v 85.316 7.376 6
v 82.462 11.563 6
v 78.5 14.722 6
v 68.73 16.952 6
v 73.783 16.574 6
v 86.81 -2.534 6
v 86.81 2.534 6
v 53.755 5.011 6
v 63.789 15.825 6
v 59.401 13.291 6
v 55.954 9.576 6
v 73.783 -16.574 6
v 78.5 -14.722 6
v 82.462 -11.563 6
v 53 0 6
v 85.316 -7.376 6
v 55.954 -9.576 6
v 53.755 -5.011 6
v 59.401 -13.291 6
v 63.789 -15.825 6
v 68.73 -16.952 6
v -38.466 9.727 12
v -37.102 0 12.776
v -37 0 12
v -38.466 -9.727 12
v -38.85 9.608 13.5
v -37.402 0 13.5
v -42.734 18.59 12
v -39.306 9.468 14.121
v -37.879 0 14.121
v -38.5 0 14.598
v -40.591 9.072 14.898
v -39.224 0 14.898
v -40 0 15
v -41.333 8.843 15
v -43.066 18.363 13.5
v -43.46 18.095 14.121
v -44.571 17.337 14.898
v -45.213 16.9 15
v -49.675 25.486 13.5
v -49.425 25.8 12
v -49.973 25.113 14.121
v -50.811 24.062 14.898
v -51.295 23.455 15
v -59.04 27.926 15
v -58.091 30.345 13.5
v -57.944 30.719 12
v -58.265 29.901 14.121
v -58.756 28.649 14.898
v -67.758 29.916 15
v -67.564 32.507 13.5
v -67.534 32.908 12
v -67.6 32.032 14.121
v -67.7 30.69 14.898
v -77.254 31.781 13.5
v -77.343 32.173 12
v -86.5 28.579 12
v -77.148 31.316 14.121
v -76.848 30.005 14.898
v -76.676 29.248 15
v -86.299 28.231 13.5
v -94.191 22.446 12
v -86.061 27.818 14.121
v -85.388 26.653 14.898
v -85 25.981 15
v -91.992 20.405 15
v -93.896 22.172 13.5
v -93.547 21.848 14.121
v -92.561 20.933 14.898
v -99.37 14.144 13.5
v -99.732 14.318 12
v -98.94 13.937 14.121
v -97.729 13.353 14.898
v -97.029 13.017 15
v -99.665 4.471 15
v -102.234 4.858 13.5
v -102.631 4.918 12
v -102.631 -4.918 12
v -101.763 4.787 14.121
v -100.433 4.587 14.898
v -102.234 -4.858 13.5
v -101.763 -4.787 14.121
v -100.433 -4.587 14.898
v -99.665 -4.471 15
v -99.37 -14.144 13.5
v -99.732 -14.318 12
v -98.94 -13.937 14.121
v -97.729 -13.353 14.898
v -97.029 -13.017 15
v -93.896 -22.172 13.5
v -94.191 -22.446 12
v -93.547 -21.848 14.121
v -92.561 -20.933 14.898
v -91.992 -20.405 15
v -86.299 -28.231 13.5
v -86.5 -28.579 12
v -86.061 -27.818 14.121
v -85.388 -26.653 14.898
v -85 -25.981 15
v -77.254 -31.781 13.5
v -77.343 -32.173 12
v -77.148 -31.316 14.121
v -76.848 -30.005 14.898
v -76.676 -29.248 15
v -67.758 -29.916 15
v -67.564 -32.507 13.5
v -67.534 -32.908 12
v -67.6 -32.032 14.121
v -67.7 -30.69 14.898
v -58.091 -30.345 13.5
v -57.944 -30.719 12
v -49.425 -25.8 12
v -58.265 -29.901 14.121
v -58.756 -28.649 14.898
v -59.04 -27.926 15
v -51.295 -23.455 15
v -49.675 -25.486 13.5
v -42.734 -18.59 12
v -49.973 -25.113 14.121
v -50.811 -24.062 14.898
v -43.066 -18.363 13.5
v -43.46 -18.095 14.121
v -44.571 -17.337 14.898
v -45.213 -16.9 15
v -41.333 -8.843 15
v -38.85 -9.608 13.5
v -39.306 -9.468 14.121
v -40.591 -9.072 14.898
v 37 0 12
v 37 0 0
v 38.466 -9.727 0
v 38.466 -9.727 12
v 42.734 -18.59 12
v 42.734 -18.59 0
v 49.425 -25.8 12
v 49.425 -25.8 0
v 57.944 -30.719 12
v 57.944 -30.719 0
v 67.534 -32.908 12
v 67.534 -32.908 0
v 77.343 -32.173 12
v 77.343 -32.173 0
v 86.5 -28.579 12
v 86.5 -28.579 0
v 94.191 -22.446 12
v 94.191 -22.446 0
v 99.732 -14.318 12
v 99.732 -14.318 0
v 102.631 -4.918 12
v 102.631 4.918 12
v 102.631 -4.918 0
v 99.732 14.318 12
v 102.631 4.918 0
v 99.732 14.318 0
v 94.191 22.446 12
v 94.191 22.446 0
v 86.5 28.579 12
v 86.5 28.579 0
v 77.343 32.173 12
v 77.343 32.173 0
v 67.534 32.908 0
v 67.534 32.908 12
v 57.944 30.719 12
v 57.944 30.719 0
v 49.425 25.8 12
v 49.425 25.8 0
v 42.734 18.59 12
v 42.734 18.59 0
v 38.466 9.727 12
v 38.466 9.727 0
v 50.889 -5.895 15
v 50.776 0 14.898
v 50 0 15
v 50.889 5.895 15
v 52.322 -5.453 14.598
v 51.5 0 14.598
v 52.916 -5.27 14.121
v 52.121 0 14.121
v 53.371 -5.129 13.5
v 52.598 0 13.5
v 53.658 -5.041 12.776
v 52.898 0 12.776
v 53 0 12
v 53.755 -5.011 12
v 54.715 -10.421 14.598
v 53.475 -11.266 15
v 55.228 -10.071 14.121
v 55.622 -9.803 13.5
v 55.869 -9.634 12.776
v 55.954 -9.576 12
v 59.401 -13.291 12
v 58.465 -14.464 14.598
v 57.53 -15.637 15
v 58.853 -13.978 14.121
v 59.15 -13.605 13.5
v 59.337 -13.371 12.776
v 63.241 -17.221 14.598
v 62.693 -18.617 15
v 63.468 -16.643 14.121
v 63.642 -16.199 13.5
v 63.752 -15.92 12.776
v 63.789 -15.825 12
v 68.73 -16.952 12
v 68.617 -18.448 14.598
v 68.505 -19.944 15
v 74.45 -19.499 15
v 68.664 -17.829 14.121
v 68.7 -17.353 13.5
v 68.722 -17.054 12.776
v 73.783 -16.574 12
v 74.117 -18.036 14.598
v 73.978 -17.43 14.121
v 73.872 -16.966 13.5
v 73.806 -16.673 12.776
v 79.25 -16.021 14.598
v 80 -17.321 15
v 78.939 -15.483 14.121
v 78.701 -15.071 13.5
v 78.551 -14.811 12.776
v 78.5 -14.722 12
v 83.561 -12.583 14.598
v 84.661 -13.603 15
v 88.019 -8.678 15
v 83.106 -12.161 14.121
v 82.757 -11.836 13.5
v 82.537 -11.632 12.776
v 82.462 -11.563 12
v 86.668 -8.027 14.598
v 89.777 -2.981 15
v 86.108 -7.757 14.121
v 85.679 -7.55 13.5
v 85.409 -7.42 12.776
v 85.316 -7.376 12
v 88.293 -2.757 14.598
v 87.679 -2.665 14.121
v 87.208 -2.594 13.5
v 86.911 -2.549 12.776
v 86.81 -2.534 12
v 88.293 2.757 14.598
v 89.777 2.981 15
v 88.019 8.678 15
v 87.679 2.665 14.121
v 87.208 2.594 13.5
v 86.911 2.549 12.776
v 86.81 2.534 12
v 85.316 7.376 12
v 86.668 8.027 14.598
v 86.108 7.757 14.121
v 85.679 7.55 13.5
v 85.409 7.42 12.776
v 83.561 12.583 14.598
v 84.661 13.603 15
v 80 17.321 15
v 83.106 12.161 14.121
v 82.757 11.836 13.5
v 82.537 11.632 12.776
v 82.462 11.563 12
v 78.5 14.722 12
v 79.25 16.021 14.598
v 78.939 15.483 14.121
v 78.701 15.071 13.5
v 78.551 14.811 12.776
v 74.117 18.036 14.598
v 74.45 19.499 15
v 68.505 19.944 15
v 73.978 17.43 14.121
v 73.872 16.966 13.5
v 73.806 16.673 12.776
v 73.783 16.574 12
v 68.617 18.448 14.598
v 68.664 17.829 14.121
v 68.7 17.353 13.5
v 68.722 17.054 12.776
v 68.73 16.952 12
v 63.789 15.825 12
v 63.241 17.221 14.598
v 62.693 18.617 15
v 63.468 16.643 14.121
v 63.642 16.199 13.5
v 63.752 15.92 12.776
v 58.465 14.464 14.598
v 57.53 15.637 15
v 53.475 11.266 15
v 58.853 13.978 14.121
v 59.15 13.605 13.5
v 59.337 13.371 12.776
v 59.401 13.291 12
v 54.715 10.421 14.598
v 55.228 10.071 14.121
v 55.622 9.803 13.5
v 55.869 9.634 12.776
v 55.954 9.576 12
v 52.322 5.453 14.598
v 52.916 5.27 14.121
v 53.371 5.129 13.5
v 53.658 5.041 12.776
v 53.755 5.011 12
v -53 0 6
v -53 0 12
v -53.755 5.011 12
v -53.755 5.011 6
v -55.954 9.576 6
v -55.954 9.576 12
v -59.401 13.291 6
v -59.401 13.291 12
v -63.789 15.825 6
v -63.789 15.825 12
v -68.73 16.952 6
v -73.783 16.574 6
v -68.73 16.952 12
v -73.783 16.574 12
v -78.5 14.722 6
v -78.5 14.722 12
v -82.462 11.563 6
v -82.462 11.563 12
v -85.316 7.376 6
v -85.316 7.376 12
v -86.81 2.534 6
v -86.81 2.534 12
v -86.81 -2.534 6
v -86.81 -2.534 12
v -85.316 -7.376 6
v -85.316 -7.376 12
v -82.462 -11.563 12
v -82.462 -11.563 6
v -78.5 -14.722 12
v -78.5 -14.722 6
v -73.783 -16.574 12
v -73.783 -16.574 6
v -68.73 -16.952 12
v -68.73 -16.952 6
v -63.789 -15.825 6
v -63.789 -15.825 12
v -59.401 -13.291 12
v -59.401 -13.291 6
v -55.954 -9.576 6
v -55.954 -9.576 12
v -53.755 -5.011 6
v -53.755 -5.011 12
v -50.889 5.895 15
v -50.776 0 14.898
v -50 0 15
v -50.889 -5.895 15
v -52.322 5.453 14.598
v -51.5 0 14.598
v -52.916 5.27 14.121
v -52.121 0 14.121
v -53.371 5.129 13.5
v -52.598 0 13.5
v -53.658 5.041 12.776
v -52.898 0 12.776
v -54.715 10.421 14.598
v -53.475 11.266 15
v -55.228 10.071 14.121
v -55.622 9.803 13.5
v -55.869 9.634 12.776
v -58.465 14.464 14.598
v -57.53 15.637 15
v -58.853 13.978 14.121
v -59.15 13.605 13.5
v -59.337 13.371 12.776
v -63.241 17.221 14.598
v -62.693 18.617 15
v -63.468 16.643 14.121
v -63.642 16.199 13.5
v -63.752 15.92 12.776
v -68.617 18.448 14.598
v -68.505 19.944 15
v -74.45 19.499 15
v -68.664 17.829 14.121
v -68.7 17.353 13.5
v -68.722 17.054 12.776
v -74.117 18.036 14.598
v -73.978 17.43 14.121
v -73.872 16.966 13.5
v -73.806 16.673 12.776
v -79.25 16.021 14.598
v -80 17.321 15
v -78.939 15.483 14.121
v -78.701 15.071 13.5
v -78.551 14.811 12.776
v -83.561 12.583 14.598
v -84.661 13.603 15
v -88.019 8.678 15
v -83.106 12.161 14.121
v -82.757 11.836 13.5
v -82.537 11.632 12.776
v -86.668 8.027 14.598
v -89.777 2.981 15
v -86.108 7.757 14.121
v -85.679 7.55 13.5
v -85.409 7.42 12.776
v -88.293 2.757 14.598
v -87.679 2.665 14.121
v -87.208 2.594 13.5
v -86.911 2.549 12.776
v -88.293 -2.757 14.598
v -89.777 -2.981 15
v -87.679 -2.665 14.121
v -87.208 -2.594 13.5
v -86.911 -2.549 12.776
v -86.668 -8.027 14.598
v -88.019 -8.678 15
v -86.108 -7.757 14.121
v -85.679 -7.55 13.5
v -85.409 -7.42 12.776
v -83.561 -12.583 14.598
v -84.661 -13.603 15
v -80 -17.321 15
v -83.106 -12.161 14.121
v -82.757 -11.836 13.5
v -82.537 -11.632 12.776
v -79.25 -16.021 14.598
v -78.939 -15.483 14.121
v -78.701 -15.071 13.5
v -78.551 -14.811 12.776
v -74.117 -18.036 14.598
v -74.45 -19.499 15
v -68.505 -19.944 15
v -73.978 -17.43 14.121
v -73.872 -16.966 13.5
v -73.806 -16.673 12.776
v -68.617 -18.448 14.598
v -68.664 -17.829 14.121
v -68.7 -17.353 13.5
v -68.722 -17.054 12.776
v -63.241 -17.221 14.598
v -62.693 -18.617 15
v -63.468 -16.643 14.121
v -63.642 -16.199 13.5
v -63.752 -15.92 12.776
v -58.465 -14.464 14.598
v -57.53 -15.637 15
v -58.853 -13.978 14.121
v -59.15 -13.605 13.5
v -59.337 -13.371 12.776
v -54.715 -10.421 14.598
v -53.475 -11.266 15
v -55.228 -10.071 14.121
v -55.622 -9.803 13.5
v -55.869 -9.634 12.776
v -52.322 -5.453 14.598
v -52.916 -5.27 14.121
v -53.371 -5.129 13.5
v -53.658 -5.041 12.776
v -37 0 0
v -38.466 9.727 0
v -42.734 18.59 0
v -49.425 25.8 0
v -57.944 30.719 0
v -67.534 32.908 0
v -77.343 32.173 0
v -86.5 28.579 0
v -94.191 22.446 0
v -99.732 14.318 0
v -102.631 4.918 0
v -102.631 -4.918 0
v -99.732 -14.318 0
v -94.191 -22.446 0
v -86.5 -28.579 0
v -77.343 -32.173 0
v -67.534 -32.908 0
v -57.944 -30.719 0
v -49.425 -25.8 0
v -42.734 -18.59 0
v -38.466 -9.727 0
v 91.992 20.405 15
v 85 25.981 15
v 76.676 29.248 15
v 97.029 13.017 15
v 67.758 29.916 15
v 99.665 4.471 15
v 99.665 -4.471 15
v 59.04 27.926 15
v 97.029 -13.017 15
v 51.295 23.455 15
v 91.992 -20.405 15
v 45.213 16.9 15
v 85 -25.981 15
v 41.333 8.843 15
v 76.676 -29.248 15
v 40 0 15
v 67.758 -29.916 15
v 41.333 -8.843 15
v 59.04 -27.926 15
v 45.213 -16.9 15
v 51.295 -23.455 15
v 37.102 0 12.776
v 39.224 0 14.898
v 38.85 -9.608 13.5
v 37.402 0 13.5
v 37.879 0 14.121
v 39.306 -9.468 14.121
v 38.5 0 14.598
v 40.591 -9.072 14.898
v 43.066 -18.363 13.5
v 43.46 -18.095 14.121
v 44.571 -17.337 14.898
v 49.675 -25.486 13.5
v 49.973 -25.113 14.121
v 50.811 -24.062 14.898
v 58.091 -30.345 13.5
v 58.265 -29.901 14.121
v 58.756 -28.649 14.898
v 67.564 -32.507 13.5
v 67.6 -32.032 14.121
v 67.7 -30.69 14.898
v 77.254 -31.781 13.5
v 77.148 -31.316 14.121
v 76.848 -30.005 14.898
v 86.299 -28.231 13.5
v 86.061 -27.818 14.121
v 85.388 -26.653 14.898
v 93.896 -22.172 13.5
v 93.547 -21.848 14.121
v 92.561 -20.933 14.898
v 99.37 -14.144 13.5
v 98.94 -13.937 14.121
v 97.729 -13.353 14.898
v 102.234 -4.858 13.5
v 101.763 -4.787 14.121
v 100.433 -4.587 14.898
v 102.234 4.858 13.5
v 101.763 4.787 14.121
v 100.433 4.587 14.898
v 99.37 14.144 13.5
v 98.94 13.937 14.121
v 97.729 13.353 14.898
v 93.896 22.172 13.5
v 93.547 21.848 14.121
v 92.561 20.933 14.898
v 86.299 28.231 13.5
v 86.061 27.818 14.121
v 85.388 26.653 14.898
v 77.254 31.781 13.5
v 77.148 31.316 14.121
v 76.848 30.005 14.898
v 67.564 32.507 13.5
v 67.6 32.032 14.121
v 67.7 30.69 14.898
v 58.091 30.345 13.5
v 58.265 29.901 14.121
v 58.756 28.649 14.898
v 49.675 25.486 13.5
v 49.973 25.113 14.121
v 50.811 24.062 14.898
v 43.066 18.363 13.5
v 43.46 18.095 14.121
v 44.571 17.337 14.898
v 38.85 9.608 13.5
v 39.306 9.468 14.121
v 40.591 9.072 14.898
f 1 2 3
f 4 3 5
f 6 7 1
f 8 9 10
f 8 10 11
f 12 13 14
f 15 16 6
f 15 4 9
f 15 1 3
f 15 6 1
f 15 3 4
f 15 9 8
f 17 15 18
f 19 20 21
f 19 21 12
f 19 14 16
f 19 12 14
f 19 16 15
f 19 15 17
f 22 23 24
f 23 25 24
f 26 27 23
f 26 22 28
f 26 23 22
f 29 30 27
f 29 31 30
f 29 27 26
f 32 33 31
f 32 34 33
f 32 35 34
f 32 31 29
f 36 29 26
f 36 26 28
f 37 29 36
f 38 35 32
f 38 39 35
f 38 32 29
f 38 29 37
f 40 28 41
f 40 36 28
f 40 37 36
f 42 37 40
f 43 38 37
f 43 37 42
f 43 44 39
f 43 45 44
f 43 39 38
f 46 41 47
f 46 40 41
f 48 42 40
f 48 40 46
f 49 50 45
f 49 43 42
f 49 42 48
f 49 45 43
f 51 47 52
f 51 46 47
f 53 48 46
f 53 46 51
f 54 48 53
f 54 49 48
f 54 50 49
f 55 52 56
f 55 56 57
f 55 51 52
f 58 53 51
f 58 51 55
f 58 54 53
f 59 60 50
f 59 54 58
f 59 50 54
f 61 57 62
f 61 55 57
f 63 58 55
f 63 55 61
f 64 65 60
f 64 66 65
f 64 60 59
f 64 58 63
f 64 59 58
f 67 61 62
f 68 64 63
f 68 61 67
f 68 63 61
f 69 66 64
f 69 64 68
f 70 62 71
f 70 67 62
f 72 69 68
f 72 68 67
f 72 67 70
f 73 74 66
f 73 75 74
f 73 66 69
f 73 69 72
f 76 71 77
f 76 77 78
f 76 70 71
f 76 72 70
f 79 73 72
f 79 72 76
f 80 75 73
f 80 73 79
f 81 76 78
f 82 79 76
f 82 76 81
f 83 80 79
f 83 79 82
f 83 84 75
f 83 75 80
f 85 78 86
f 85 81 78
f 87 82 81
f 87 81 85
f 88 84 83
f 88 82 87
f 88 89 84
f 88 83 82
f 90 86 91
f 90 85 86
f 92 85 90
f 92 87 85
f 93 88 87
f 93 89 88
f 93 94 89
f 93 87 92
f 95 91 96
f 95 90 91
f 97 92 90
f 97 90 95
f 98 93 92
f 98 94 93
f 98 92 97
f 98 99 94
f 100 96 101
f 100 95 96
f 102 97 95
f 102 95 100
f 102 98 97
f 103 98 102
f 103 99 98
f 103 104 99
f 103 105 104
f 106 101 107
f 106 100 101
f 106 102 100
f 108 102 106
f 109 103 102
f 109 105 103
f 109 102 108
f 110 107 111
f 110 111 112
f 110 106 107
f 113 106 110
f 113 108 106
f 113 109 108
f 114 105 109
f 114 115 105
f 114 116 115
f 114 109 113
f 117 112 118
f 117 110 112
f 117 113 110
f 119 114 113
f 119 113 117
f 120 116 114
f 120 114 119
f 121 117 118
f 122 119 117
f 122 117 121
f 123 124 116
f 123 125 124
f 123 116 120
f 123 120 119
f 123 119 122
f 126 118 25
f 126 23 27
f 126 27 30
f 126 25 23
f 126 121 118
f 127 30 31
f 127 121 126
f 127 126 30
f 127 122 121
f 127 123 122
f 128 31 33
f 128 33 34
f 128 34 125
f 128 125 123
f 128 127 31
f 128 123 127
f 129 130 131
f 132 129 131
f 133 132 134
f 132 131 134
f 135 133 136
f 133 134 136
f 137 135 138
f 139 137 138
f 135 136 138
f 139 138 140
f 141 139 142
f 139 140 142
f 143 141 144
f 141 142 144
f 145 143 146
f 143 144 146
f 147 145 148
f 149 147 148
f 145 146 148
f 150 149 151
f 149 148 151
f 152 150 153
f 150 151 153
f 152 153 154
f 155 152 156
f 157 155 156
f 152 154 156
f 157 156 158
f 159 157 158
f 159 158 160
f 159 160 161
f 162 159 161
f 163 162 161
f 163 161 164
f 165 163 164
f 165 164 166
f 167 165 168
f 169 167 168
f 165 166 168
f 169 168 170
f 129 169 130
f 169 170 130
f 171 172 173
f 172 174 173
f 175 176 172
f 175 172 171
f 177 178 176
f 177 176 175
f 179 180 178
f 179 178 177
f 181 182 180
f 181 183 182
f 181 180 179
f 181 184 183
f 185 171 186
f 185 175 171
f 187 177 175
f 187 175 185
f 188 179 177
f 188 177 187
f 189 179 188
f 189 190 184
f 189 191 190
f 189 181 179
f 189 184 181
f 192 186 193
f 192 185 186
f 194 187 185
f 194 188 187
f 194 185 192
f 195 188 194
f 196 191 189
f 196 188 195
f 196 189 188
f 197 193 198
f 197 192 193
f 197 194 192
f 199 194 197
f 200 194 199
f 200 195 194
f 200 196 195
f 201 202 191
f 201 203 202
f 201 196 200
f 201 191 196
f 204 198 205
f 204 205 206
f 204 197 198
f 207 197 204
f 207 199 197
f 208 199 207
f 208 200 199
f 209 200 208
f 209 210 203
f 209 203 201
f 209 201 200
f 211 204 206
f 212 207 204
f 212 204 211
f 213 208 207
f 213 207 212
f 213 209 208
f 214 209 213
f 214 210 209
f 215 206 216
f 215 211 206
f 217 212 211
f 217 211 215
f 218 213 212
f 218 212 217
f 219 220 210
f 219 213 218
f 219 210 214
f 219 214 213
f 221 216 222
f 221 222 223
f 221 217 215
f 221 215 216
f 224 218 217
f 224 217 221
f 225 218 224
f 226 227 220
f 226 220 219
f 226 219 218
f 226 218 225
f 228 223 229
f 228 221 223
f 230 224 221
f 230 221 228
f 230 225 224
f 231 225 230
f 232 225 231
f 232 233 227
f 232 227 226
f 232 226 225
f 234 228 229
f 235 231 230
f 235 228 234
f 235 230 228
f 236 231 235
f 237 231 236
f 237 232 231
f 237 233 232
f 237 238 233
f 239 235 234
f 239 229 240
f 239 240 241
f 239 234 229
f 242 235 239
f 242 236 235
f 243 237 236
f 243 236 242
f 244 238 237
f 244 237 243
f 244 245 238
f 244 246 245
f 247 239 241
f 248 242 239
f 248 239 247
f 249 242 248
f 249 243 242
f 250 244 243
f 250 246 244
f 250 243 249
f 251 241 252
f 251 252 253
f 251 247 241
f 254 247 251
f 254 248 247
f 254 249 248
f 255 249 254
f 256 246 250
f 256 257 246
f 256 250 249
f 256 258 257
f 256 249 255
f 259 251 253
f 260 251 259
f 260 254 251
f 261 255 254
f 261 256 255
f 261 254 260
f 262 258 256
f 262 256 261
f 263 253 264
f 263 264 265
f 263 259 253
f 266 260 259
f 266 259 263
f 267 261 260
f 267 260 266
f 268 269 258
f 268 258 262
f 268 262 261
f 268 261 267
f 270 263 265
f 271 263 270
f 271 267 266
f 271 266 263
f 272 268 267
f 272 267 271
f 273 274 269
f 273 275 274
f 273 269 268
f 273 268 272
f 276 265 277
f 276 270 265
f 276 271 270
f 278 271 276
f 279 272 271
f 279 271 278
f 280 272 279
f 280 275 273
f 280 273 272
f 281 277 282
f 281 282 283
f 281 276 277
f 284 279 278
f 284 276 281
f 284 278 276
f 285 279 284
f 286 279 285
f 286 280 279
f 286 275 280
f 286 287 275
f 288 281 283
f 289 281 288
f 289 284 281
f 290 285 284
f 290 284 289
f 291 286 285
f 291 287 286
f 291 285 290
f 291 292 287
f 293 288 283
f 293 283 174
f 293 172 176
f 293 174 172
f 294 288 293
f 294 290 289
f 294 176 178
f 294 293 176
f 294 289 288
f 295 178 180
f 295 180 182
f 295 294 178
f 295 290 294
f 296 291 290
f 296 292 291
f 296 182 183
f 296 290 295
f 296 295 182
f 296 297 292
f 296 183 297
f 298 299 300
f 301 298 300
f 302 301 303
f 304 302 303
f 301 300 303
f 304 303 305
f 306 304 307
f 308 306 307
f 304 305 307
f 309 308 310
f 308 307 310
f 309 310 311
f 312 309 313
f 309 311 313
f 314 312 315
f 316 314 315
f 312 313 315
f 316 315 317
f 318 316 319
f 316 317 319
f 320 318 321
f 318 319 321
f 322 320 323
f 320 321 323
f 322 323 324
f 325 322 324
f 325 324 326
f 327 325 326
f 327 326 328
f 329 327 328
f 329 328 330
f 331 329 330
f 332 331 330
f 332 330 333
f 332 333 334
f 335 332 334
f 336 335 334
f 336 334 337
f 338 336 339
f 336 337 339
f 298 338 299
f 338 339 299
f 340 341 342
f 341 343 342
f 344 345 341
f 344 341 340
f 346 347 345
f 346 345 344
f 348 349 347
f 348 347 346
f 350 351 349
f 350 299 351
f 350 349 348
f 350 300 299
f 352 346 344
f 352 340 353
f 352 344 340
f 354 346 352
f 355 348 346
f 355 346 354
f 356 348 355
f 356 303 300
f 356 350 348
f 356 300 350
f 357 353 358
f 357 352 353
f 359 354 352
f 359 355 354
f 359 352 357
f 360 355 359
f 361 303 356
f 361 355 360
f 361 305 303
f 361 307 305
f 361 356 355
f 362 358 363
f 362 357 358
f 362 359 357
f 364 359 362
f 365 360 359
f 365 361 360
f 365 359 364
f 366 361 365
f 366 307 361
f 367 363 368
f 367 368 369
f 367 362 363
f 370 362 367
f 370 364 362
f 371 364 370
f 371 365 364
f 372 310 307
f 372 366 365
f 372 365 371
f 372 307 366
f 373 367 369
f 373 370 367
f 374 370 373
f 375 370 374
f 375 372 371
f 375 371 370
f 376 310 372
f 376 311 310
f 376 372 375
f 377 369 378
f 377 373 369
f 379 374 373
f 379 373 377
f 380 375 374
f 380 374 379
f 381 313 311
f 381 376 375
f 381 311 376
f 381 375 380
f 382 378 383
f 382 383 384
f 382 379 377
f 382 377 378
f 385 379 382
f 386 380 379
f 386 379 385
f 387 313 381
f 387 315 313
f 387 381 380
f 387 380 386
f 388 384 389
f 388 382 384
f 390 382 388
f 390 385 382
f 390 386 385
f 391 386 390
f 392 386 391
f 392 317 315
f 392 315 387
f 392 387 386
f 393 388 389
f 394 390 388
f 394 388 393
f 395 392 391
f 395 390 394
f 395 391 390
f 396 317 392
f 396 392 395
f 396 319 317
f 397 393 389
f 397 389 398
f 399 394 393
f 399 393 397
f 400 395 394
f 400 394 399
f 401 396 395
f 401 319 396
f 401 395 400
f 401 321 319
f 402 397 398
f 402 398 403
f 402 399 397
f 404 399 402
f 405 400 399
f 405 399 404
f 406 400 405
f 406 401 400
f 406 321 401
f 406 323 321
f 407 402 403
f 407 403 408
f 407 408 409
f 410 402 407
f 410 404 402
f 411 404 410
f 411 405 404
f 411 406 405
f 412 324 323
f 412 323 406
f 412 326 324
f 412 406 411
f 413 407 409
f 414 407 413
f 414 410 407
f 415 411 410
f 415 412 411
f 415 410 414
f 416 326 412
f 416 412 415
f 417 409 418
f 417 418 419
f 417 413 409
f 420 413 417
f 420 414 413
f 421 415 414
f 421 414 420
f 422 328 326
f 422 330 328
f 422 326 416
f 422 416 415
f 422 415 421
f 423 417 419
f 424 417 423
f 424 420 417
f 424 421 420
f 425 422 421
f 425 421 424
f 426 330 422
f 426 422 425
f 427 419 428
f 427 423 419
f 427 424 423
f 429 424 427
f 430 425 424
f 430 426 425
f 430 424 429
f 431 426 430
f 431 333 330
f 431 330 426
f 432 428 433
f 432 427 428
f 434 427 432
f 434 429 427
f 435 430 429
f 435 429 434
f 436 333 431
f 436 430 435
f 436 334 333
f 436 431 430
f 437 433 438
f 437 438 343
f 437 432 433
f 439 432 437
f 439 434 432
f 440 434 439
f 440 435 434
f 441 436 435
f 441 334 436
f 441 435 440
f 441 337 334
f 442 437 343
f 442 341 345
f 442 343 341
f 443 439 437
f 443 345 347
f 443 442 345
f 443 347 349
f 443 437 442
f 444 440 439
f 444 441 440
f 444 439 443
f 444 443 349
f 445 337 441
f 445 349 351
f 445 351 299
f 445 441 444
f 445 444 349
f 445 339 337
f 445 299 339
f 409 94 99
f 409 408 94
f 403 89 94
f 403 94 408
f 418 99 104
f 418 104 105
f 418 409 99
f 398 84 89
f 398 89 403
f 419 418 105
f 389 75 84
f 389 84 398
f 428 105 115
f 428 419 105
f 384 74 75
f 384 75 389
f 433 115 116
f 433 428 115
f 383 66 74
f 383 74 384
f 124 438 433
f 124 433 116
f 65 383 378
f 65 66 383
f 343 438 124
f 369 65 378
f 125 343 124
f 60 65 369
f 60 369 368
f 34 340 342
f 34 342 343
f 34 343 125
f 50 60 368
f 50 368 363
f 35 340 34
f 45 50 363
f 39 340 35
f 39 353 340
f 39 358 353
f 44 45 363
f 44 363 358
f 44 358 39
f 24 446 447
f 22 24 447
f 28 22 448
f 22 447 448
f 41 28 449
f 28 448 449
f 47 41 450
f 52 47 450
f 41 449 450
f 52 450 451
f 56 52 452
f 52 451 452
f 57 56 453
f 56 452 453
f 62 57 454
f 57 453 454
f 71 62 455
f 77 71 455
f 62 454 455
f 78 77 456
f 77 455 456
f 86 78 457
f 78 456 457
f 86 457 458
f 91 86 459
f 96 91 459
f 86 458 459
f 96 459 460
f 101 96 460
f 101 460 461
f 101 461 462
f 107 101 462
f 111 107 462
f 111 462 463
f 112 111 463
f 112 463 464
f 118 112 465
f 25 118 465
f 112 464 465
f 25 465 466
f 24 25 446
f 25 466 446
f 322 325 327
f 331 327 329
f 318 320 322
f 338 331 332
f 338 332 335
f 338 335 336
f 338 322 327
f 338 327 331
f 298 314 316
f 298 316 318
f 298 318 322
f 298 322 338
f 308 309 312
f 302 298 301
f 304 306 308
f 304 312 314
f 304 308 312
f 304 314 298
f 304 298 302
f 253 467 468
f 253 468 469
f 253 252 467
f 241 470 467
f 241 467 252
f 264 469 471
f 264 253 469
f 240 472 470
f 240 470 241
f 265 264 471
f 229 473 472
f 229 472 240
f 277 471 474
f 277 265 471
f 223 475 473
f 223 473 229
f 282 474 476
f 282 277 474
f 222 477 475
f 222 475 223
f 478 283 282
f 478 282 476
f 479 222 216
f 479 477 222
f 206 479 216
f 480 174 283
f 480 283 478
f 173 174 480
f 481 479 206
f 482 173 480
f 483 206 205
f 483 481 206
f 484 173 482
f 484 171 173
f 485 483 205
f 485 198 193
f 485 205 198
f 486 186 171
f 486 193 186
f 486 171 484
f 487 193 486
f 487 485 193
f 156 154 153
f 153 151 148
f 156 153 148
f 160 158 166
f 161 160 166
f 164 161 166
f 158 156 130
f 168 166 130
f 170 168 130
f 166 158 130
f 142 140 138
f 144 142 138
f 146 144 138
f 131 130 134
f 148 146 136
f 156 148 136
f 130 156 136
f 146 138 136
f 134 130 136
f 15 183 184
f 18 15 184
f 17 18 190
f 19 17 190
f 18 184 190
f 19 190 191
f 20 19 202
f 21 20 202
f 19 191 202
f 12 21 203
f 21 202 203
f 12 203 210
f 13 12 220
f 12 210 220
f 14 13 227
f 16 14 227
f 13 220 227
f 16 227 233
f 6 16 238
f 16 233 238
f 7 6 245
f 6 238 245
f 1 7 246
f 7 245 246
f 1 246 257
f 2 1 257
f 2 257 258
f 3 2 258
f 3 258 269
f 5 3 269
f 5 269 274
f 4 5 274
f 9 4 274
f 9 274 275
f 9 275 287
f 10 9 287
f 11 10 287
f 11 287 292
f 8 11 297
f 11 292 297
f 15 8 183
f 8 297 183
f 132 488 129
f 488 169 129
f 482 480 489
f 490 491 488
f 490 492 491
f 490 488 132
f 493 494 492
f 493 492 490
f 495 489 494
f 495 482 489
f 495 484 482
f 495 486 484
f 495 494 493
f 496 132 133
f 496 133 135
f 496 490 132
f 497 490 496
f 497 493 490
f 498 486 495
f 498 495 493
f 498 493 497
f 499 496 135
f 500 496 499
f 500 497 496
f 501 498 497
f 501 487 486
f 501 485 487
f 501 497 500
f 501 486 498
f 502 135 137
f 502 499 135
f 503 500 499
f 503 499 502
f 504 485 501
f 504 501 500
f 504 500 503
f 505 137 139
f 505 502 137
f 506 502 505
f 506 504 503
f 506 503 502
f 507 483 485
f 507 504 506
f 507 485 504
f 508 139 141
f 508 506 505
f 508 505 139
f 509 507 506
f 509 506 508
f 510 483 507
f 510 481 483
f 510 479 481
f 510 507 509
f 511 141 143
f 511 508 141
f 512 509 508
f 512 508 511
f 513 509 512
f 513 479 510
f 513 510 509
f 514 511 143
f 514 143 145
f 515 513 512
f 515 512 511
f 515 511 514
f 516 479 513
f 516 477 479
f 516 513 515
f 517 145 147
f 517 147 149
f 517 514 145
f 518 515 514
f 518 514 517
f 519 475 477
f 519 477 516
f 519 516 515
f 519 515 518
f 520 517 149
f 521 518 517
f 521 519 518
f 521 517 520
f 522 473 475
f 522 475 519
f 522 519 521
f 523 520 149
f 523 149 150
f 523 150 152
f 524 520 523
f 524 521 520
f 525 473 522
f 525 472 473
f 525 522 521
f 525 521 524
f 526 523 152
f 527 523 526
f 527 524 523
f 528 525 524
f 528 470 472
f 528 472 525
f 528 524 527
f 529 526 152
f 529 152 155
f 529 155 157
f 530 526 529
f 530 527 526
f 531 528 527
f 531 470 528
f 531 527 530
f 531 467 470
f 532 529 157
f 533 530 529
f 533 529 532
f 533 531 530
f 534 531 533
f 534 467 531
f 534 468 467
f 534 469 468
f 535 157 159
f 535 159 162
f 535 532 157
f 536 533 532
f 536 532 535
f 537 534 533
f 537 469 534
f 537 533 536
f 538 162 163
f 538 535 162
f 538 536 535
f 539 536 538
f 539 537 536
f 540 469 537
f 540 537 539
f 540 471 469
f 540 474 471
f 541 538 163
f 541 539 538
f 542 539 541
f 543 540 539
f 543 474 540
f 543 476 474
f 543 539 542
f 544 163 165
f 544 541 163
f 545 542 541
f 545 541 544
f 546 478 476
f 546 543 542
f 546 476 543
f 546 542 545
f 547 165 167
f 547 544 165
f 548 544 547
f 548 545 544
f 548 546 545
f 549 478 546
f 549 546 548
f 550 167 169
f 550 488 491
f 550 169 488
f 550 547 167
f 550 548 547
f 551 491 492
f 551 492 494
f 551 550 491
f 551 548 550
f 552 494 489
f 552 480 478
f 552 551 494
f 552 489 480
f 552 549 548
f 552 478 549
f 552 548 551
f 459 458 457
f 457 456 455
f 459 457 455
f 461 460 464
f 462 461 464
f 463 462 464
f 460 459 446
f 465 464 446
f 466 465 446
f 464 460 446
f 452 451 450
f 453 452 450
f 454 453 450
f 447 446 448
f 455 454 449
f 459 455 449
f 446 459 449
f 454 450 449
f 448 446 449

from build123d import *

# Parameters (mm, degrees)
SKETCH1_R             = 33
BOSS_EXTRUDE1_DEPTH   = 15
BOSS_EXTRUDE1_2_DEPTH = 15
SKETCH2_R             = 17
CUT_EXTRUDE1_DEPTH    = 9
FILLET1_R             = 3
FILLET2_R             = 3
FILLET3_R             = 3
FILLET4_R             = 3


with BuildPart() as part:
    # Sketch1 → Boss-Extrude1 (new body)
    with BuildSketch(Plane.XY):
        with Locations((-70, 0)):
            Circle(SKETCH1_R)
    extrude(amount=BOSS_EXTRUDE1_DEPTH)


with BuildPart() as body_2:
    # Sketch1 → Boss-Extrude1 2 (new body)
    with BuildSketch(Plane.XY):
        with Locations(Location((70, 0, 0), (0, 0, 180))):
            Circle(SKETCH1_R)
    extrude(amount=BOSS_EXTRUDE1_2_DEPTH)


with BuildPart() as cut_extrude1_tool:
    # Sketch2 → Cut-Extrude1 (new body)
    with BuildSketch(Plane.XY.offset(15)):
        with Locations((-70, 0)):
            Circle(SKETCH2_R)
        with Locations(Location((70, 0, 0), (0, 0, 180))):
            Circle(SKETCH2_R)
    extrude(amount=-CUT_EXTRUDE1_DEPTH)


with BuildPart() as part_1:
    add(part.part)

    # Cut-Extrude1: cut by cut_extrude1_tool
    add(cut_extrude1_tool.part, mode=Mode.SUBTRACT)

    # Fillet1
    fillet1_edges = [part_1.edges().sort_by_distance(p)[0] for p in [
        (-103, 0, 15),
    ]]
    fillet(fillet1_edges, radius=FILLET1_R)

    # Fillet4
    fillet4_edges = [part_1.edges().sort_by_distance(p)[0] for p in [
        (-87, 0, 15),
    ]]
    fillet(fillet4_edges, radius=FILLET4_R)


with BuildPart() as body_2_1:
    add(body_2.part)

    # Cut-Extrude1: cut by cut_extrude1_tool
    add(cut_extrude1_tool.part, mode=Mode.SUBTRACT)

    # Fillet2
    fillet2_edges = [body_2_1.edges().sort_by_distance(p)[0] for p in [
        (103, 0, 15),
    ]]
    fillet(fillet2_edges, radius=FILLET2_R)

    # Fillet3
    fillet3_edges = [body_2_1.edges().sort_by_distance(p)[0] for p in [
        (87, 0, 15),
    ]]
    fillet(fillet3_edges, radius=FILLET3_R)


solid = Compound([part_1.part, body_2_1.part])
